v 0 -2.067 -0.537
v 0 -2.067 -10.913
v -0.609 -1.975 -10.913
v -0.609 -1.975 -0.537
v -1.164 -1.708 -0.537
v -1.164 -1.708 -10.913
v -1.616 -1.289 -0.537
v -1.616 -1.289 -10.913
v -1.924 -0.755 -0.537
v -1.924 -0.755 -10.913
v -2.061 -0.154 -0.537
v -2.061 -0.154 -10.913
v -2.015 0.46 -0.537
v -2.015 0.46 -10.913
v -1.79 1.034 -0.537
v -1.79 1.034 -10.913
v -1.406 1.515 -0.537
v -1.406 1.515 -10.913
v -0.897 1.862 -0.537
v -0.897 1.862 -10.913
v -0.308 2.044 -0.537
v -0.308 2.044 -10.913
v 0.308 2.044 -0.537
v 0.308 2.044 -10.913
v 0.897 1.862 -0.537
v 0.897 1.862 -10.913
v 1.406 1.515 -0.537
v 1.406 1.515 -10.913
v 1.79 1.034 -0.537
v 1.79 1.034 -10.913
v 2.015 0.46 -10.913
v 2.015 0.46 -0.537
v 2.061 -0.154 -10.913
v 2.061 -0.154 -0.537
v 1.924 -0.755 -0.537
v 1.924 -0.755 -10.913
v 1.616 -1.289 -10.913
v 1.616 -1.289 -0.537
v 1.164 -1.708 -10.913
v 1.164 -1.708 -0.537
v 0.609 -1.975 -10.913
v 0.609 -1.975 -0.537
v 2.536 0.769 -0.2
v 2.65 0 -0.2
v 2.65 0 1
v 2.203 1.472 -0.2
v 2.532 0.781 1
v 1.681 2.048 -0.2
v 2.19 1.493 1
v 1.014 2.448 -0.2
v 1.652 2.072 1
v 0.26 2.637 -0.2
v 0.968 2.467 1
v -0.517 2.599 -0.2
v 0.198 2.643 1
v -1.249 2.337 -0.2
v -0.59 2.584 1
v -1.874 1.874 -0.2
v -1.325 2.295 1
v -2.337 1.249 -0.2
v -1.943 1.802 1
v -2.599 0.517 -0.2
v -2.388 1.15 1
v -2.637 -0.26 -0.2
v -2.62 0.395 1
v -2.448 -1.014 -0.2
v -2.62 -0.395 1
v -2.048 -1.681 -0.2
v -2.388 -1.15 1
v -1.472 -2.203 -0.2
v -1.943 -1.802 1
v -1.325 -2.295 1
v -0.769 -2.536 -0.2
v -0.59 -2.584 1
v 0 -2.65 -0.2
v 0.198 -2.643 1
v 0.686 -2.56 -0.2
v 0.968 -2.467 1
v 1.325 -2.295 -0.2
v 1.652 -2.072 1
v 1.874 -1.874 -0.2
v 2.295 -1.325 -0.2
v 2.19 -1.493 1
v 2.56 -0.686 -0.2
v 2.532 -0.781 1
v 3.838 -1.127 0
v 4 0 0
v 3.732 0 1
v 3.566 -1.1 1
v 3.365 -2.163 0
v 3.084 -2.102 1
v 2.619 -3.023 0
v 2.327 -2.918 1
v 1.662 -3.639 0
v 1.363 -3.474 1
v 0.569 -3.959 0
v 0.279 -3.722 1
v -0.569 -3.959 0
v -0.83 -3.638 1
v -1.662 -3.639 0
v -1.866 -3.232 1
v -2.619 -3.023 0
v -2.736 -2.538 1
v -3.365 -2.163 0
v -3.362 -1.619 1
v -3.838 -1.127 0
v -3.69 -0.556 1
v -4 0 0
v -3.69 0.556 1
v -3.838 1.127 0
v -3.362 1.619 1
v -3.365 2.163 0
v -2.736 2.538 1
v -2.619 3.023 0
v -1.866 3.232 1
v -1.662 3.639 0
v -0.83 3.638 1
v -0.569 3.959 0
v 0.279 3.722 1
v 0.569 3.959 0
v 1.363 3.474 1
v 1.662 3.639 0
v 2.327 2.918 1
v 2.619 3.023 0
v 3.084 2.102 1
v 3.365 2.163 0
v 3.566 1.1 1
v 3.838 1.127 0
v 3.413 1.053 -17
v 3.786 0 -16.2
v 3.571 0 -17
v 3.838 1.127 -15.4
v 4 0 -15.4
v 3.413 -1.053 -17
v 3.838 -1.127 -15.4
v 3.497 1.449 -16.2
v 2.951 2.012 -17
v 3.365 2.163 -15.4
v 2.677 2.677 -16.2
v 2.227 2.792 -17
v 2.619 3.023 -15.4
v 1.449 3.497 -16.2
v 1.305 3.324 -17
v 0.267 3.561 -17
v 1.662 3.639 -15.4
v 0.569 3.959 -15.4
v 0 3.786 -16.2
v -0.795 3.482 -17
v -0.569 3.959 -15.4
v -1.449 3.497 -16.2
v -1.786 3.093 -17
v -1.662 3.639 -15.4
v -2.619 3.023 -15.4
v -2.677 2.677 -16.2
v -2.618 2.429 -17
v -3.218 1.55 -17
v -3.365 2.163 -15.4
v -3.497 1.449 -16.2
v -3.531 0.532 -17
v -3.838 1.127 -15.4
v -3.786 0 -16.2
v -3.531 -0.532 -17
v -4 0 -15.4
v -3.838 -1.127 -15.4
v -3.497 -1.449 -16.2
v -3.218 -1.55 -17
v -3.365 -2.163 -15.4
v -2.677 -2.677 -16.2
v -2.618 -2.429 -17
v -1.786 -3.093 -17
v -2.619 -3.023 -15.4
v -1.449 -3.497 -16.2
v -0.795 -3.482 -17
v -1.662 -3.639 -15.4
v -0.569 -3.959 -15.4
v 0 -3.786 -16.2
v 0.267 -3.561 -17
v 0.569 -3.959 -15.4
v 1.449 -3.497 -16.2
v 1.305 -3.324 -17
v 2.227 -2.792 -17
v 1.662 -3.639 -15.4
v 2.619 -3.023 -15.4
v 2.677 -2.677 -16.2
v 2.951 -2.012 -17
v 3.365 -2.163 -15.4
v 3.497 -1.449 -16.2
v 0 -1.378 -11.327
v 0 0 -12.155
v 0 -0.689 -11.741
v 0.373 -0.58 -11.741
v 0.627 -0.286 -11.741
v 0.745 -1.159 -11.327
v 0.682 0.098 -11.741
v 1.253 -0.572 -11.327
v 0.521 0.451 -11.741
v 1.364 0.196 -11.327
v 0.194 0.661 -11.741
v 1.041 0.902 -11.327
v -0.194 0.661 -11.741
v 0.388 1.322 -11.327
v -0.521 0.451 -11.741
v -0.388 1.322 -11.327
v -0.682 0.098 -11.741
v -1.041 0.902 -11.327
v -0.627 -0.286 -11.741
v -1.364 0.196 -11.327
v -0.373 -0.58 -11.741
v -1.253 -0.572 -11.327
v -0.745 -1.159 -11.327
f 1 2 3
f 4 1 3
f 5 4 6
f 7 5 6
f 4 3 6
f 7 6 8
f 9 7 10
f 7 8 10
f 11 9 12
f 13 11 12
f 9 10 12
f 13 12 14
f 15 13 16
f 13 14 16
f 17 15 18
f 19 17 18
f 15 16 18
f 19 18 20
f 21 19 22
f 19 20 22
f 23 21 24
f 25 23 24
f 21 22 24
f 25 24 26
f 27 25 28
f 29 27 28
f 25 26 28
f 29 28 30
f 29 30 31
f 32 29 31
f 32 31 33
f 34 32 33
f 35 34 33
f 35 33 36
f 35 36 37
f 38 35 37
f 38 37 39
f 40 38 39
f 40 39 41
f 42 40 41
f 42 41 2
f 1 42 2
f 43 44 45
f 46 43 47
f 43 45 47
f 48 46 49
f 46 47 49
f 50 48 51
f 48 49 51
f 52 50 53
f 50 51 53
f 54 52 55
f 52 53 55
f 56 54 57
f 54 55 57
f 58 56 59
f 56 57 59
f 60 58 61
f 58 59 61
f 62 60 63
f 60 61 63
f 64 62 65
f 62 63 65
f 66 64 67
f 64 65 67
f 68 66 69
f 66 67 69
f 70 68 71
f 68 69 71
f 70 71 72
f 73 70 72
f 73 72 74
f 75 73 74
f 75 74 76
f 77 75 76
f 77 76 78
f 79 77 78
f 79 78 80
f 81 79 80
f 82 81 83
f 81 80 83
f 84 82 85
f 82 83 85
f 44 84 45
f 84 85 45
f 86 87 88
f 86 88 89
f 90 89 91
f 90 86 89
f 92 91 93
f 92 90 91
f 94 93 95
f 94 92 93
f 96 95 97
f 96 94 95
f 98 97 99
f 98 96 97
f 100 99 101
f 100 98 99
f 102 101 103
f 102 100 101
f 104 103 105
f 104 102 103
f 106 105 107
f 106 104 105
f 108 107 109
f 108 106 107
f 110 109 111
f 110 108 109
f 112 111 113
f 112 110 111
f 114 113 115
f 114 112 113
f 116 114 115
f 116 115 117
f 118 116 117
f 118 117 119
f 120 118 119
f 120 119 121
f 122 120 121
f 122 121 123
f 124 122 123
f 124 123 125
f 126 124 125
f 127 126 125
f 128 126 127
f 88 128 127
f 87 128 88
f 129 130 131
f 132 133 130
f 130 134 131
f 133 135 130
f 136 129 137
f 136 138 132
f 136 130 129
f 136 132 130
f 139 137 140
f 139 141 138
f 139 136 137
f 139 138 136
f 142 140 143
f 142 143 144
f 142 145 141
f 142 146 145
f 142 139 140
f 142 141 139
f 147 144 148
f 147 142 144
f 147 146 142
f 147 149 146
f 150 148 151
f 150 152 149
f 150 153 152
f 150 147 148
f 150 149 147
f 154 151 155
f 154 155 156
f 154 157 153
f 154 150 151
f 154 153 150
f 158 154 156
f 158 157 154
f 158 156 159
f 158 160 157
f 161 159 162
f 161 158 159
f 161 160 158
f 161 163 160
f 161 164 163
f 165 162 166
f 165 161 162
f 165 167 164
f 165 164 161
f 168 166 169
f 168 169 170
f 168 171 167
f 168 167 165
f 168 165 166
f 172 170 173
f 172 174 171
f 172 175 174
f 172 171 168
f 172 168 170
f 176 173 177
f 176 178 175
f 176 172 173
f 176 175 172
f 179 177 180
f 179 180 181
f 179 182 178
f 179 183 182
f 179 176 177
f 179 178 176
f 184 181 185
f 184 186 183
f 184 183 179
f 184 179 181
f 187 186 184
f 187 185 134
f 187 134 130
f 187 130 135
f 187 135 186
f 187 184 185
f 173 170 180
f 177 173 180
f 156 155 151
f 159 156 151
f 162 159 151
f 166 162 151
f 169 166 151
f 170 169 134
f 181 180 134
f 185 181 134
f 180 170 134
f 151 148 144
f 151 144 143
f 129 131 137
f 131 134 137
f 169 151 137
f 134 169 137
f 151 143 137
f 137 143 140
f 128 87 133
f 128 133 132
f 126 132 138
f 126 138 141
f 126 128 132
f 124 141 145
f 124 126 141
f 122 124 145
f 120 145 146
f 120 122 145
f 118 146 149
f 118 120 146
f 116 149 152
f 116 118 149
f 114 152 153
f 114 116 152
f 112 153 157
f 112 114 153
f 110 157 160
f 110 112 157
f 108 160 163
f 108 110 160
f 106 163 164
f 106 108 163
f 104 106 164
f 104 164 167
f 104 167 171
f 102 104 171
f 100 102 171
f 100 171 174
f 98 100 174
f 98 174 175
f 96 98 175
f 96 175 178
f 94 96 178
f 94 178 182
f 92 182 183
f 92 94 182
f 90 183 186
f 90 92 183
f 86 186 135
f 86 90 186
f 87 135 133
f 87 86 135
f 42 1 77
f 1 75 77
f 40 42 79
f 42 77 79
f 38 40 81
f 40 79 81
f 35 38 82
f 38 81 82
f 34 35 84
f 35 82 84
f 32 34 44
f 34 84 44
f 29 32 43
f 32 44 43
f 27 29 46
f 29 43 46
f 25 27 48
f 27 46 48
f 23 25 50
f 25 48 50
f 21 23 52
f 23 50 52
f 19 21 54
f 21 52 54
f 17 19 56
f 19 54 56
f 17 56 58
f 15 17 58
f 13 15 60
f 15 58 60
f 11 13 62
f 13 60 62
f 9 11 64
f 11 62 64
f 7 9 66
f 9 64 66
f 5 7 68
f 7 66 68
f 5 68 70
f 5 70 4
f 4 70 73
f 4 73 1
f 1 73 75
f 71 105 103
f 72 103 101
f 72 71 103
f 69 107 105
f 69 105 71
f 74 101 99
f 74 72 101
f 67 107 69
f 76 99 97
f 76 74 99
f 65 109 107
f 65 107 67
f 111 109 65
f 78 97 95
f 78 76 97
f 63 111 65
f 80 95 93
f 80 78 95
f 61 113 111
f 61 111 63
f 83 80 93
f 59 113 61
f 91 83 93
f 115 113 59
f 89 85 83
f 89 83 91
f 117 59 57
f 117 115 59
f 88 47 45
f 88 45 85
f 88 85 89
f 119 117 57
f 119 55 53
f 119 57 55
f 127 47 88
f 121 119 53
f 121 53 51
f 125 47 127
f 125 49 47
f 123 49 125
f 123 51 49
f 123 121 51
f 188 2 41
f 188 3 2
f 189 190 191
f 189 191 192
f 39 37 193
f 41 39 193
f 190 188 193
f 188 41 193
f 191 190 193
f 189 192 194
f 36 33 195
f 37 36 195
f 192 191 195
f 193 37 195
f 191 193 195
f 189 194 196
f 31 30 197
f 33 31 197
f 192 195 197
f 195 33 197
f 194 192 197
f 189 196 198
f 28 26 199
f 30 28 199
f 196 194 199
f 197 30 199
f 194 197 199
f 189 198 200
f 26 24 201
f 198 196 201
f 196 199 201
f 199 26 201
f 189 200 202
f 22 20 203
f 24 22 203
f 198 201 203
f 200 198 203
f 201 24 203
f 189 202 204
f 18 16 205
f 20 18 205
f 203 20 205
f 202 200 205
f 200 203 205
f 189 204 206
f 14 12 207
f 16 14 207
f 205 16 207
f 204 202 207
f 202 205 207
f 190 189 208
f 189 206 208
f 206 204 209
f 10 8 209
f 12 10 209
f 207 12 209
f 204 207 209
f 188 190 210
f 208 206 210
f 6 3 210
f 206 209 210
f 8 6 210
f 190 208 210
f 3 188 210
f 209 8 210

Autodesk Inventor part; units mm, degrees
ref_plane "WorkPlane8" through (0, 0, 0) normal (1, 0, 0) x (0, 1, 0)
ref_plane "WorkPlane7" through (0, 0, 0) normal (0, 1, 0) x (-1, 0, 0)
ref_plane "XY Plane" through (0, 0, 0) normal (0, 0, 1) x (1, 0, 0)
sketch "Sketch2" plane through (0, 0, 0) normal (0, 0, 1) x (1, 0, 0)
  circle A0 centre (0, 0) radius 4
  dimension "d1" = 8
extrude "Extrusion1" add sketch "Sketch2" against normal blind 17
chamfer "Chamfer1" distance 1.6 angle 15 1 edges at (-4, 0, -17) measured on face at (3.9482, -0.6416, -11.3333)
sketch "Sketch3" plane through (0, 0, 0) normal (0, 0, 1) x (1, 0, 0)
  circle A0 centre (0, 0) radius 4
  circle A1 centre (0, 0) radius 4 construction
  dimension "d7" = 8
extrude "Extrusion2" add sketch "Sketch3" along normal blind 1 draft -15
sketch "Sketch4" plane through (0, 0, 1) normal (0, 0, 1) x (1, 0, 0)
  circle A0 centre (0, 0) radius 2.65
  circle A1 centre (0, 0) radius 3.7321 construction
  dimension "d13" = 5.3
extrude "Extrusion3" cut sketch "Sketch4" against normal blind 1.2
sketch "Sketch5" plane through (0, 0, -0.2) normal (0, 0, 1) x (1, 0, 0)
  circle A0 centre (0, 0) radius 2.65 projected
hole "Hole1" at (0, 0, -0.2) direction (0, 0, -1) diameter 4.134 depth 10.7134 tip angle 118 countersink diameter 5.3 countersink angle 120 thread size "M5x0.8" class "6H" standard "ISO Metric profile"
equation "\"d4\" = c2"
equation "\"d30\" = c2"
equation "\"d2\" = -c1 + NLG"
equation "\"d7\" = Diam1"
equation "\"d8\" = c1"
equation "\"d13\" = Diam3"
equation "\"d14\" = t3"
equation "\"d19\" = -t3 + t1 + 0.288675 * Diam2 - 0.288675 * Diam3"
equation "\"d20\" = Diam3"
equation "\"d23\" = -t3 + t2 + 0.288675 * Diam2 - 0.288675 * Diam3"
equation "\"d1\" = Diam1"
equation "\"Diam1\" = 8"
equation "\"Diam2\" = 5"
equation "\"Diam3\" = 5.3"
equation "\"t1\" = 8"
equation "\"t2\" = 12"
equation "\"t3\" = 1.2"
equation "\"NLG\" = 18"
equation "\"c1\" = 1"
equation "\"c2\" = 1.6"
equation "\"P\" = 1"
equation "\"THREADDIA\" = Diam2"
equation "\"PTC\" = 0.8"
properties part number "CSN EN ISO 8733 - 8x18-St" material "Stainless Steel, Austenitic"
